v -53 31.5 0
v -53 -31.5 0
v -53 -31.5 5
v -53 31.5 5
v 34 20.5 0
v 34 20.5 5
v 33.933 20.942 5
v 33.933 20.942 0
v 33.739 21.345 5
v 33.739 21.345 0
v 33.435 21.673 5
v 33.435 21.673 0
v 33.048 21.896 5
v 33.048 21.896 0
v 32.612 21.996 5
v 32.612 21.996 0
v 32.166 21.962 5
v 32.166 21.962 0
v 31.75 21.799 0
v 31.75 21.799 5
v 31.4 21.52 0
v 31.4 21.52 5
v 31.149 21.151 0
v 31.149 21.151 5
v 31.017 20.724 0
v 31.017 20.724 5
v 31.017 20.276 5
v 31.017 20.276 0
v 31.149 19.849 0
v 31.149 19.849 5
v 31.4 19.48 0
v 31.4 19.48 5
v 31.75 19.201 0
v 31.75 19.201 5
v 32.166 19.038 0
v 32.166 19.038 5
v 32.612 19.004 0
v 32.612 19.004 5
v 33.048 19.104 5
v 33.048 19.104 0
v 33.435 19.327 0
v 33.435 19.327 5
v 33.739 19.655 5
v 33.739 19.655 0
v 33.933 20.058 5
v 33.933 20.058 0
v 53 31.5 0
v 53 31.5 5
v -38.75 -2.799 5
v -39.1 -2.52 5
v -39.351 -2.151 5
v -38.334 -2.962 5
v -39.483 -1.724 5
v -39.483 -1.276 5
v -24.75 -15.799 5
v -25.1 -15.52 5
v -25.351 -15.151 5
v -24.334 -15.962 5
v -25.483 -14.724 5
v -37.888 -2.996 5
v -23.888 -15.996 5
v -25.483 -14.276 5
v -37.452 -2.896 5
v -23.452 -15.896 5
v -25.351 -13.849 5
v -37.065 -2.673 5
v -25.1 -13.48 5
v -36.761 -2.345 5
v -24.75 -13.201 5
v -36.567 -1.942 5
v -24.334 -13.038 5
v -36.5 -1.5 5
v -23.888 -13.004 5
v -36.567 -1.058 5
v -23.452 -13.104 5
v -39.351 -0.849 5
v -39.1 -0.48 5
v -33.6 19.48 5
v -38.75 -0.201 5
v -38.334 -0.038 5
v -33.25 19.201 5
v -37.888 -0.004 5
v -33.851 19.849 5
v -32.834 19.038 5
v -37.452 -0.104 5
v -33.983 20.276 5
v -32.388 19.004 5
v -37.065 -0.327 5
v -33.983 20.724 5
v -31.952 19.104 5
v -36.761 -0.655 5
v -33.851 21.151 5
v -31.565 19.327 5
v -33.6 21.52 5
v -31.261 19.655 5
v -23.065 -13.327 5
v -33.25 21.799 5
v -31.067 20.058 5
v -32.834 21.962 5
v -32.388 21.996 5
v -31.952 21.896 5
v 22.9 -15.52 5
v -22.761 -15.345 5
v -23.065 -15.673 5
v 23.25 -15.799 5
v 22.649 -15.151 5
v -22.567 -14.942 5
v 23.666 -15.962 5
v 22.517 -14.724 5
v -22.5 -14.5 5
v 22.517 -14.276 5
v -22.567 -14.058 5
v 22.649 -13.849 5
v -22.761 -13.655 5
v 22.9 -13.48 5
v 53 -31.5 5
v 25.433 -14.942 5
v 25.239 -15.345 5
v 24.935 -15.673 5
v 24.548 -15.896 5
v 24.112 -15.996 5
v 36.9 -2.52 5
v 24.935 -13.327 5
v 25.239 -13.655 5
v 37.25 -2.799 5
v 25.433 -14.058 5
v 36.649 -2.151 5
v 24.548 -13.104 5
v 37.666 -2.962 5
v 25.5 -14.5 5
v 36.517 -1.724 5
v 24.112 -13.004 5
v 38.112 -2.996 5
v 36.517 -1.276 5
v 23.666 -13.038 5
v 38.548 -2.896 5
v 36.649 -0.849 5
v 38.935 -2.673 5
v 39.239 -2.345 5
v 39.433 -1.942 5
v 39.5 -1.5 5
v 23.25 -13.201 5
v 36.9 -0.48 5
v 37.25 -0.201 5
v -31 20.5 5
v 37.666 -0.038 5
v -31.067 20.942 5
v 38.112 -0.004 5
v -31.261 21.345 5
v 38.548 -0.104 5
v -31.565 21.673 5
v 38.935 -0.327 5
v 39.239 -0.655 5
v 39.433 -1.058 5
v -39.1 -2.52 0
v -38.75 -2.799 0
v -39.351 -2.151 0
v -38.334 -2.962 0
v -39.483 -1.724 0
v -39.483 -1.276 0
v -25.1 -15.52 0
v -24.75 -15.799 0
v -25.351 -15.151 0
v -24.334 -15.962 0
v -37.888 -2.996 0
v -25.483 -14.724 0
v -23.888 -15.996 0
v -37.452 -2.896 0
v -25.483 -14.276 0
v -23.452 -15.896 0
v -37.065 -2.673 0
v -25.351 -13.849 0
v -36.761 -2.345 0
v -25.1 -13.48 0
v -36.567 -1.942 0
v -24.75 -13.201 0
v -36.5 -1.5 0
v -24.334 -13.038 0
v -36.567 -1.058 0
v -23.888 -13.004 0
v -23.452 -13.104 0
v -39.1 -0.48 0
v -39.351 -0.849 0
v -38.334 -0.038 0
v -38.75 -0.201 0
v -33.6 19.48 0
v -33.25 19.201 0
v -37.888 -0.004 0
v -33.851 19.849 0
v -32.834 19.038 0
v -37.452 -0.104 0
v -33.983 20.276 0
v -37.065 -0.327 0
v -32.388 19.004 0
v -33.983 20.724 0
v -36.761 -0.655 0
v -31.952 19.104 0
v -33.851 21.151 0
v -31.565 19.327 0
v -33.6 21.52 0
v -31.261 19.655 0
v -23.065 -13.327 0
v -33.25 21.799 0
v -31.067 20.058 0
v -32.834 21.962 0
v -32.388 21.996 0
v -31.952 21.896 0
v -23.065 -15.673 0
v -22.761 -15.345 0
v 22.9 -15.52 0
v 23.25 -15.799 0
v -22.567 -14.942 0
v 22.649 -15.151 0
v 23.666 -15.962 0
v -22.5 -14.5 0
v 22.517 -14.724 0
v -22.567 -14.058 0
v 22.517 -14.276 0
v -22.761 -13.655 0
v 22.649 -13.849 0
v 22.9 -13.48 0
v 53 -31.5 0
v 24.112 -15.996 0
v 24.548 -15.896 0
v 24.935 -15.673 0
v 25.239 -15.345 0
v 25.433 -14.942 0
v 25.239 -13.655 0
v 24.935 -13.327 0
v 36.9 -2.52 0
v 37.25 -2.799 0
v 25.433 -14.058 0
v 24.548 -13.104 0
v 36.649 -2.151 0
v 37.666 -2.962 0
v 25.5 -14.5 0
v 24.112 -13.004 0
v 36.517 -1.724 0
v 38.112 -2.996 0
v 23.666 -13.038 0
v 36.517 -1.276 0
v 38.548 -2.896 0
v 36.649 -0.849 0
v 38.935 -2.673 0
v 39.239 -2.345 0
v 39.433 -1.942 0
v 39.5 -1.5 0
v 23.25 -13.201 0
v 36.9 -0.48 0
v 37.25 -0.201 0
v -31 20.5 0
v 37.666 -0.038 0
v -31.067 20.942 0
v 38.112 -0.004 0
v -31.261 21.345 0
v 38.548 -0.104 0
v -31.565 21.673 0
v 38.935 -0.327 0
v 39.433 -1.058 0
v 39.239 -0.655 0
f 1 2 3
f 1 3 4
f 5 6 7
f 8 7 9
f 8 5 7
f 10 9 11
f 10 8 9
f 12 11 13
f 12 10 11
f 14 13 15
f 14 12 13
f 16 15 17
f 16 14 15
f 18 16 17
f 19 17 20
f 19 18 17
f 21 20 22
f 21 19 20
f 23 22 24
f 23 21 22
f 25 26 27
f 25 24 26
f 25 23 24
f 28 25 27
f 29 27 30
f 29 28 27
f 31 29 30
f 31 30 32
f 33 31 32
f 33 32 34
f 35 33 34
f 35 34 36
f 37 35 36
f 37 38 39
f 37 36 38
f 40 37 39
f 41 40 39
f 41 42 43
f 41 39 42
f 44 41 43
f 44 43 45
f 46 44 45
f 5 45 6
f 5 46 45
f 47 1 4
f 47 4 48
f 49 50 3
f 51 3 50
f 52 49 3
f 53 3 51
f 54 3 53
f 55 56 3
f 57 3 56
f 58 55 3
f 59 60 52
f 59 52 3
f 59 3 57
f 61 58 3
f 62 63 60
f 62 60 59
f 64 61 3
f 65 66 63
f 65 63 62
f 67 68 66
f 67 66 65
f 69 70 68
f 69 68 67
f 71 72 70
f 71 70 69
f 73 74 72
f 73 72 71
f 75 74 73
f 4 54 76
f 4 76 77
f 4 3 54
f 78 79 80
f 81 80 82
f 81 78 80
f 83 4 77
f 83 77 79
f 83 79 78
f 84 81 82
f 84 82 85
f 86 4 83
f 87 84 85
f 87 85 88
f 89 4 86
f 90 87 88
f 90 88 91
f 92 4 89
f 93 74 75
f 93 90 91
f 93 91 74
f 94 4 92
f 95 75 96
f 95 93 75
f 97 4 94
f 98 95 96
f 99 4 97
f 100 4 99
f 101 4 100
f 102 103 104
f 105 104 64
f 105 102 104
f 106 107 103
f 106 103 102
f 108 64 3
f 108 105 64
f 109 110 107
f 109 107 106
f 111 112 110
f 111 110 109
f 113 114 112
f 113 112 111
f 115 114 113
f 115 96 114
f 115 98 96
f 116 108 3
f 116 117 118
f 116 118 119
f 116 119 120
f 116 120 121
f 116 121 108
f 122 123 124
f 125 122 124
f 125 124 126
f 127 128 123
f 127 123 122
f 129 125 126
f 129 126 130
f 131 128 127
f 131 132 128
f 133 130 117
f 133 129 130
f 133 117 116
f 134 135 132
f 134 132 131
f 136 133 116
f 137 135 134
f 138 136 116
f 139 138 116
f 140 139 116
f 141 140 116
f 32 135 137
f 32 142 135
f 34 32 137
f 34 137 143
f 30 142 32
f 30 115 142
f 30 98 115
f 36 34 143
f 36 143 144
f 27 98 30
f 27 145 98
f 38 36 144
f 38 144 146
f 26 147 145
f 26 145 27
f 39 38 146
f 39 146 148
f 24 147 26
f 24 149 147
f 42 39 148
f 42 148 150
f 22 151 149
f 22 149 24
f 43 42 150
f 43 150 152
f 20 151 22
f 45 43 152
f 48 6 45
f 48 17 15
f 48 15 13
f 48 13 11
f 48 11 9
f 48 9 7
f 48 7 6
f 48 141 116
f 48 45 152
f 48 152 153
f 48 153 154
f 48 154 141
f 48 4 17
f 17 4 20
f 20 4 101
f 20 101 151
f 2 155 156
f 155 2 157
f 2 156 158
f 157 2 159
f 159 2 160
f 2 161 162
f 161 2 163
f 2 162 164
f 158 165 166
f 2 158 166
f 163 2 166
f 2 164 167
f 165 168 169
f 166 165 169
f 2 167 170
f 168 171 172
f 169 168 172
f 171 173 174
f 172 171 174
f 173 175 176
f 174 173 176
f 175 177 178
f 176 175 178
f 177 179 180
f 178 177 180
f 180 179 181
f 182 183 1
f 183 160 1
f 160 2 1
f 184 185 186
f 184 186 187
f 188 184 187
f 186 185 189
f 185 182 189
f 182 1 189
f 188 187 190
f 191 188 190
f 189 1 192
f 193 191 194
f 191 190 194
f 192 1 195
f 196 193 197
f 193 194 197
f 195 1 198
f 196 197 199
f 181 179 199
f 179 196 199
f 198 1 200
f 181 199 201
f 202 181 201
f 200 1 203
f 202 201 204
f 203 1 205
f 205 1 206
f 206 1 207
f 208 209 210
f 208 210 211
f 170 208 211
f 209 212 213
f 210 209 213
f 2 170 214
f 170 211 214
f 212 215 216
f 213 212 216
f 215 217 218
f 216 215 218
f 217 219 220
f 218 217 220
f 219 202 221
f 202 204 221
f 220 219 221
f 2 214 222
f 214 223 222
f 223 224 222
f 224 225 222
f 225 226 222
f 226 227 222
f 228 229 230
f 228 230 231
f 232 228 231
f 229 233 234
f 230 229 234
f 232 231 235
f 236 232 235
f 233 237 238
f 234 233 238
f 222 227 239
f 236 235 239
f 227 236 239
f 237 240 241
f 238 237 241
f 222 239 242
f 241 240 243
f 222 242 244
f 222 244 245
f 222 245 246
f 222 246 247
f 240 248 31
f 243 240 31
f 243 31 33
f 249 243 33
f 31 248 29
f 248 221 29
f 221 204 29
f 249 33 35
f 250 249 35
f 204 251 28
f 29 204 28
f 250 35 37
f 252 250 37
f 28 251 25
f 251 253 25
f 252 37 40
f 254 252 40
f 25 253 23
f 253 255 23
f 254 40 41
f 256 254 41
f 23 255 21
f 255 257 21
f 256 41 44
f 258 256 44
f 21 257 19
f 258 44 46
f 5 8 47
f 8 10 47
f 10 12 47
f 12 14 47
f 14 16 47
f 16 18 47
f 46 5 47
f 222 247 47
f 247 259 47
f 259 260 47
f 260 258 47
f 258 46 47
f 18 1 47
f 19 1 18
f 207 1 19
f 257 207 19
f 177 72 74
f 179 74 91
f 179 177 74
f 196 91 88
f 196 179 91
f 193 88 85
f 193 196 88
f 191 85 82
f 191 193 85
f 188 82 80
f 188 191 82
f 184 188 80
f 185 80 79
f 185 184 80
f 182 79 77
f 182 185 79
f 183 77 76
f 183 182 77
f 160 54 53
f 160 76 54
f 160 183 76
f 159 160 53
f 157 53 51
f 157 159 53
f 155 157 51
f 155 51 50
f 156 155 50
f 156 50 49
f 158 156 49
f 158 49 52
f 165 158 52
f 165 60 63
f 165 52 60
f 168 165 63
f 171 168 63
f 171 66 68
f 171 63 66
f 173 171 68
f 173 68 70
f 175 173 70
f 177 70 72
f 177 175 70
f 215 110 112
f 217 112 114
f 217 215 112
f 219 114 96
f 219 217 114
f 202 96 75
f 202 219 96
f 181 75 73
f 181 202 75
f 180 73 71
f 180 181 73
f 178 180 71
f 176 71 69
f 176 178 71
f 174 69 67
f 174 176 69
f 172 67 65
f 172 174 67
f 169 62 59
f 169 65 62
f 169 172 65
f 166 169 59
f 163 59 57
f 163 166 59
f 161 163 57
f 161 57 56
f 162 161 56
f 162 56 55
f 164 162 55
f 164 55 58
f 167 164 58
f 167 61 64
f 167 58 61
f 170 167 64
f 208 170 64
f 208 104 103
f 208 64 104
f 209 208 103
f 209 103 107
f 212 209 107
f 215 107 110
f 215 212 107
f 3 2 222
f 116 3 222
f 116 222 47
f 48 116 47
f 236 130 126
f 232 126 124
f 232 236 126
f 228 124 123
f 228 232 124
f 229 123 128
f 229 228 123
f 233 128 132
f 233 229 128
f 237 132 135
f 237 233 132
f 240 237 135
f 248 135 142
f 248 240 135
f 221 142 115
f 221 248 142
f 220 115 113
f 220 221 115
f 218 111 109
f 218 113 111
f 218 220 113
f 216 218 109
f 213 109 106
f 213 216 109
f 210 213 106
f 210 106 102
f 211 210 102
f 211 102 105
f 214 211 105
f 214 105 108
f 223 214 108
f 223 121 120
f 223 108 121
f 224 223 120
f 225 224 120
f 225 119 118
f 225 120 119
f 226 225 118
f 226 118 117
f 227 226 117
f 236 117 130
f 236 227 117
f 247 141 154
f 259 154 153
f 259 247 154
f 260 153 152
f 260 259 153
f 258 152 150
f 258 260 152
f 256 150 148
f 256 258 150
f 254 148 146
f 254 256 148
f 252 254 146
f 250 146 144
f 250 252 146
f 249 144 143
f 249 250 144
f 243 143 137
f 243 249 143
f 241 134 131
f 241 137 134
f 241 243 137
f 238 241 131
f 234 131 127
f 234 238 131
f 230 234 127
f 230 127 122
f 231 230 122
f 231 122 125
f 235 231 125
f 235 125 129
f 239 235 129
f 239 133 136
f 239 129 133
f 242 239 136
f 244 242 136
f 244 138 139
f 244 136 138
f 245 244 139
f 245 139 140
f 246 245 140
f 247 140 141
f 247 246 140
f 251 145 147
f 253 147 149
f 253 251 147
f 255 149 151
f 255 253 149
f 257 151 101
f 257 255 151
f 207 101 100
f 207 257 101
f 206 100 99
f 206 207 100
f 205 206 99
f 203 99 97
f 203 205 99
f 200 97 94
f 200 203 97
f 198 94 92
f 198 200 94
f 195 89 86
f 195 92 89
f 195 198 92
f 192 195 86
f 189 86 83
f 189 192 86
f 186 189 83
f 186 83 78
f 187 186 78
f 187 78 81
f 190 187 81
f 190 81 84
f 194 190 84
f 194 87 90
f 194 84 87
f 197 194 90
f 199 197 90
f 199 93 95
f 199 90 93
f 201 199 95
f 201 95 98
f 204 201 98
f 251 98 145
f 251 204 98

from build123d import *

# Parameters (mm, degrees)
SKETCH1_W           = 106
SKETCH1_H           = 63
BOSS_EXTRUDE1_DEPTH = 5
SKETCH2_R           = 1.5
CUT_EXTRUDE2_DEPTH  = 6


with BuildPart() as part:
    # Sketch1 → Boss-Extrude1 (new body)
    with BuildSketch(Plane.XY):
        Rectangle(SKETCH1_W, SKETCH1_H)
    extrude(amount=BOSS_EXTRUDE1_DEPTH)

    # Sketch2 → Cut-Extrude2 (cut, through all)
    with BuildSketch(Plane.XY):
        with Locations((-24, -14.5)):
            Circle(SKETCH2_R)
        with Locations((24, -14.5)):
            Circle(SKETCH2_R)
        with Locations((-38, -1.5)):
            Circle(SKETCH2_R)
        with Locations((38, -1.5)):
            Circle(SKETCH2_R)
        with Locations((-32.5, 20.5)):
            Circle(SKETCH2_R)
        with Locations((32.5, 20.5)):
            Circle(SKETCH2_R)
    extrude(amount=CUT_EXTRUDE2_DEPTH, mode=Mode.SUBTRACT)


solid = part.part
